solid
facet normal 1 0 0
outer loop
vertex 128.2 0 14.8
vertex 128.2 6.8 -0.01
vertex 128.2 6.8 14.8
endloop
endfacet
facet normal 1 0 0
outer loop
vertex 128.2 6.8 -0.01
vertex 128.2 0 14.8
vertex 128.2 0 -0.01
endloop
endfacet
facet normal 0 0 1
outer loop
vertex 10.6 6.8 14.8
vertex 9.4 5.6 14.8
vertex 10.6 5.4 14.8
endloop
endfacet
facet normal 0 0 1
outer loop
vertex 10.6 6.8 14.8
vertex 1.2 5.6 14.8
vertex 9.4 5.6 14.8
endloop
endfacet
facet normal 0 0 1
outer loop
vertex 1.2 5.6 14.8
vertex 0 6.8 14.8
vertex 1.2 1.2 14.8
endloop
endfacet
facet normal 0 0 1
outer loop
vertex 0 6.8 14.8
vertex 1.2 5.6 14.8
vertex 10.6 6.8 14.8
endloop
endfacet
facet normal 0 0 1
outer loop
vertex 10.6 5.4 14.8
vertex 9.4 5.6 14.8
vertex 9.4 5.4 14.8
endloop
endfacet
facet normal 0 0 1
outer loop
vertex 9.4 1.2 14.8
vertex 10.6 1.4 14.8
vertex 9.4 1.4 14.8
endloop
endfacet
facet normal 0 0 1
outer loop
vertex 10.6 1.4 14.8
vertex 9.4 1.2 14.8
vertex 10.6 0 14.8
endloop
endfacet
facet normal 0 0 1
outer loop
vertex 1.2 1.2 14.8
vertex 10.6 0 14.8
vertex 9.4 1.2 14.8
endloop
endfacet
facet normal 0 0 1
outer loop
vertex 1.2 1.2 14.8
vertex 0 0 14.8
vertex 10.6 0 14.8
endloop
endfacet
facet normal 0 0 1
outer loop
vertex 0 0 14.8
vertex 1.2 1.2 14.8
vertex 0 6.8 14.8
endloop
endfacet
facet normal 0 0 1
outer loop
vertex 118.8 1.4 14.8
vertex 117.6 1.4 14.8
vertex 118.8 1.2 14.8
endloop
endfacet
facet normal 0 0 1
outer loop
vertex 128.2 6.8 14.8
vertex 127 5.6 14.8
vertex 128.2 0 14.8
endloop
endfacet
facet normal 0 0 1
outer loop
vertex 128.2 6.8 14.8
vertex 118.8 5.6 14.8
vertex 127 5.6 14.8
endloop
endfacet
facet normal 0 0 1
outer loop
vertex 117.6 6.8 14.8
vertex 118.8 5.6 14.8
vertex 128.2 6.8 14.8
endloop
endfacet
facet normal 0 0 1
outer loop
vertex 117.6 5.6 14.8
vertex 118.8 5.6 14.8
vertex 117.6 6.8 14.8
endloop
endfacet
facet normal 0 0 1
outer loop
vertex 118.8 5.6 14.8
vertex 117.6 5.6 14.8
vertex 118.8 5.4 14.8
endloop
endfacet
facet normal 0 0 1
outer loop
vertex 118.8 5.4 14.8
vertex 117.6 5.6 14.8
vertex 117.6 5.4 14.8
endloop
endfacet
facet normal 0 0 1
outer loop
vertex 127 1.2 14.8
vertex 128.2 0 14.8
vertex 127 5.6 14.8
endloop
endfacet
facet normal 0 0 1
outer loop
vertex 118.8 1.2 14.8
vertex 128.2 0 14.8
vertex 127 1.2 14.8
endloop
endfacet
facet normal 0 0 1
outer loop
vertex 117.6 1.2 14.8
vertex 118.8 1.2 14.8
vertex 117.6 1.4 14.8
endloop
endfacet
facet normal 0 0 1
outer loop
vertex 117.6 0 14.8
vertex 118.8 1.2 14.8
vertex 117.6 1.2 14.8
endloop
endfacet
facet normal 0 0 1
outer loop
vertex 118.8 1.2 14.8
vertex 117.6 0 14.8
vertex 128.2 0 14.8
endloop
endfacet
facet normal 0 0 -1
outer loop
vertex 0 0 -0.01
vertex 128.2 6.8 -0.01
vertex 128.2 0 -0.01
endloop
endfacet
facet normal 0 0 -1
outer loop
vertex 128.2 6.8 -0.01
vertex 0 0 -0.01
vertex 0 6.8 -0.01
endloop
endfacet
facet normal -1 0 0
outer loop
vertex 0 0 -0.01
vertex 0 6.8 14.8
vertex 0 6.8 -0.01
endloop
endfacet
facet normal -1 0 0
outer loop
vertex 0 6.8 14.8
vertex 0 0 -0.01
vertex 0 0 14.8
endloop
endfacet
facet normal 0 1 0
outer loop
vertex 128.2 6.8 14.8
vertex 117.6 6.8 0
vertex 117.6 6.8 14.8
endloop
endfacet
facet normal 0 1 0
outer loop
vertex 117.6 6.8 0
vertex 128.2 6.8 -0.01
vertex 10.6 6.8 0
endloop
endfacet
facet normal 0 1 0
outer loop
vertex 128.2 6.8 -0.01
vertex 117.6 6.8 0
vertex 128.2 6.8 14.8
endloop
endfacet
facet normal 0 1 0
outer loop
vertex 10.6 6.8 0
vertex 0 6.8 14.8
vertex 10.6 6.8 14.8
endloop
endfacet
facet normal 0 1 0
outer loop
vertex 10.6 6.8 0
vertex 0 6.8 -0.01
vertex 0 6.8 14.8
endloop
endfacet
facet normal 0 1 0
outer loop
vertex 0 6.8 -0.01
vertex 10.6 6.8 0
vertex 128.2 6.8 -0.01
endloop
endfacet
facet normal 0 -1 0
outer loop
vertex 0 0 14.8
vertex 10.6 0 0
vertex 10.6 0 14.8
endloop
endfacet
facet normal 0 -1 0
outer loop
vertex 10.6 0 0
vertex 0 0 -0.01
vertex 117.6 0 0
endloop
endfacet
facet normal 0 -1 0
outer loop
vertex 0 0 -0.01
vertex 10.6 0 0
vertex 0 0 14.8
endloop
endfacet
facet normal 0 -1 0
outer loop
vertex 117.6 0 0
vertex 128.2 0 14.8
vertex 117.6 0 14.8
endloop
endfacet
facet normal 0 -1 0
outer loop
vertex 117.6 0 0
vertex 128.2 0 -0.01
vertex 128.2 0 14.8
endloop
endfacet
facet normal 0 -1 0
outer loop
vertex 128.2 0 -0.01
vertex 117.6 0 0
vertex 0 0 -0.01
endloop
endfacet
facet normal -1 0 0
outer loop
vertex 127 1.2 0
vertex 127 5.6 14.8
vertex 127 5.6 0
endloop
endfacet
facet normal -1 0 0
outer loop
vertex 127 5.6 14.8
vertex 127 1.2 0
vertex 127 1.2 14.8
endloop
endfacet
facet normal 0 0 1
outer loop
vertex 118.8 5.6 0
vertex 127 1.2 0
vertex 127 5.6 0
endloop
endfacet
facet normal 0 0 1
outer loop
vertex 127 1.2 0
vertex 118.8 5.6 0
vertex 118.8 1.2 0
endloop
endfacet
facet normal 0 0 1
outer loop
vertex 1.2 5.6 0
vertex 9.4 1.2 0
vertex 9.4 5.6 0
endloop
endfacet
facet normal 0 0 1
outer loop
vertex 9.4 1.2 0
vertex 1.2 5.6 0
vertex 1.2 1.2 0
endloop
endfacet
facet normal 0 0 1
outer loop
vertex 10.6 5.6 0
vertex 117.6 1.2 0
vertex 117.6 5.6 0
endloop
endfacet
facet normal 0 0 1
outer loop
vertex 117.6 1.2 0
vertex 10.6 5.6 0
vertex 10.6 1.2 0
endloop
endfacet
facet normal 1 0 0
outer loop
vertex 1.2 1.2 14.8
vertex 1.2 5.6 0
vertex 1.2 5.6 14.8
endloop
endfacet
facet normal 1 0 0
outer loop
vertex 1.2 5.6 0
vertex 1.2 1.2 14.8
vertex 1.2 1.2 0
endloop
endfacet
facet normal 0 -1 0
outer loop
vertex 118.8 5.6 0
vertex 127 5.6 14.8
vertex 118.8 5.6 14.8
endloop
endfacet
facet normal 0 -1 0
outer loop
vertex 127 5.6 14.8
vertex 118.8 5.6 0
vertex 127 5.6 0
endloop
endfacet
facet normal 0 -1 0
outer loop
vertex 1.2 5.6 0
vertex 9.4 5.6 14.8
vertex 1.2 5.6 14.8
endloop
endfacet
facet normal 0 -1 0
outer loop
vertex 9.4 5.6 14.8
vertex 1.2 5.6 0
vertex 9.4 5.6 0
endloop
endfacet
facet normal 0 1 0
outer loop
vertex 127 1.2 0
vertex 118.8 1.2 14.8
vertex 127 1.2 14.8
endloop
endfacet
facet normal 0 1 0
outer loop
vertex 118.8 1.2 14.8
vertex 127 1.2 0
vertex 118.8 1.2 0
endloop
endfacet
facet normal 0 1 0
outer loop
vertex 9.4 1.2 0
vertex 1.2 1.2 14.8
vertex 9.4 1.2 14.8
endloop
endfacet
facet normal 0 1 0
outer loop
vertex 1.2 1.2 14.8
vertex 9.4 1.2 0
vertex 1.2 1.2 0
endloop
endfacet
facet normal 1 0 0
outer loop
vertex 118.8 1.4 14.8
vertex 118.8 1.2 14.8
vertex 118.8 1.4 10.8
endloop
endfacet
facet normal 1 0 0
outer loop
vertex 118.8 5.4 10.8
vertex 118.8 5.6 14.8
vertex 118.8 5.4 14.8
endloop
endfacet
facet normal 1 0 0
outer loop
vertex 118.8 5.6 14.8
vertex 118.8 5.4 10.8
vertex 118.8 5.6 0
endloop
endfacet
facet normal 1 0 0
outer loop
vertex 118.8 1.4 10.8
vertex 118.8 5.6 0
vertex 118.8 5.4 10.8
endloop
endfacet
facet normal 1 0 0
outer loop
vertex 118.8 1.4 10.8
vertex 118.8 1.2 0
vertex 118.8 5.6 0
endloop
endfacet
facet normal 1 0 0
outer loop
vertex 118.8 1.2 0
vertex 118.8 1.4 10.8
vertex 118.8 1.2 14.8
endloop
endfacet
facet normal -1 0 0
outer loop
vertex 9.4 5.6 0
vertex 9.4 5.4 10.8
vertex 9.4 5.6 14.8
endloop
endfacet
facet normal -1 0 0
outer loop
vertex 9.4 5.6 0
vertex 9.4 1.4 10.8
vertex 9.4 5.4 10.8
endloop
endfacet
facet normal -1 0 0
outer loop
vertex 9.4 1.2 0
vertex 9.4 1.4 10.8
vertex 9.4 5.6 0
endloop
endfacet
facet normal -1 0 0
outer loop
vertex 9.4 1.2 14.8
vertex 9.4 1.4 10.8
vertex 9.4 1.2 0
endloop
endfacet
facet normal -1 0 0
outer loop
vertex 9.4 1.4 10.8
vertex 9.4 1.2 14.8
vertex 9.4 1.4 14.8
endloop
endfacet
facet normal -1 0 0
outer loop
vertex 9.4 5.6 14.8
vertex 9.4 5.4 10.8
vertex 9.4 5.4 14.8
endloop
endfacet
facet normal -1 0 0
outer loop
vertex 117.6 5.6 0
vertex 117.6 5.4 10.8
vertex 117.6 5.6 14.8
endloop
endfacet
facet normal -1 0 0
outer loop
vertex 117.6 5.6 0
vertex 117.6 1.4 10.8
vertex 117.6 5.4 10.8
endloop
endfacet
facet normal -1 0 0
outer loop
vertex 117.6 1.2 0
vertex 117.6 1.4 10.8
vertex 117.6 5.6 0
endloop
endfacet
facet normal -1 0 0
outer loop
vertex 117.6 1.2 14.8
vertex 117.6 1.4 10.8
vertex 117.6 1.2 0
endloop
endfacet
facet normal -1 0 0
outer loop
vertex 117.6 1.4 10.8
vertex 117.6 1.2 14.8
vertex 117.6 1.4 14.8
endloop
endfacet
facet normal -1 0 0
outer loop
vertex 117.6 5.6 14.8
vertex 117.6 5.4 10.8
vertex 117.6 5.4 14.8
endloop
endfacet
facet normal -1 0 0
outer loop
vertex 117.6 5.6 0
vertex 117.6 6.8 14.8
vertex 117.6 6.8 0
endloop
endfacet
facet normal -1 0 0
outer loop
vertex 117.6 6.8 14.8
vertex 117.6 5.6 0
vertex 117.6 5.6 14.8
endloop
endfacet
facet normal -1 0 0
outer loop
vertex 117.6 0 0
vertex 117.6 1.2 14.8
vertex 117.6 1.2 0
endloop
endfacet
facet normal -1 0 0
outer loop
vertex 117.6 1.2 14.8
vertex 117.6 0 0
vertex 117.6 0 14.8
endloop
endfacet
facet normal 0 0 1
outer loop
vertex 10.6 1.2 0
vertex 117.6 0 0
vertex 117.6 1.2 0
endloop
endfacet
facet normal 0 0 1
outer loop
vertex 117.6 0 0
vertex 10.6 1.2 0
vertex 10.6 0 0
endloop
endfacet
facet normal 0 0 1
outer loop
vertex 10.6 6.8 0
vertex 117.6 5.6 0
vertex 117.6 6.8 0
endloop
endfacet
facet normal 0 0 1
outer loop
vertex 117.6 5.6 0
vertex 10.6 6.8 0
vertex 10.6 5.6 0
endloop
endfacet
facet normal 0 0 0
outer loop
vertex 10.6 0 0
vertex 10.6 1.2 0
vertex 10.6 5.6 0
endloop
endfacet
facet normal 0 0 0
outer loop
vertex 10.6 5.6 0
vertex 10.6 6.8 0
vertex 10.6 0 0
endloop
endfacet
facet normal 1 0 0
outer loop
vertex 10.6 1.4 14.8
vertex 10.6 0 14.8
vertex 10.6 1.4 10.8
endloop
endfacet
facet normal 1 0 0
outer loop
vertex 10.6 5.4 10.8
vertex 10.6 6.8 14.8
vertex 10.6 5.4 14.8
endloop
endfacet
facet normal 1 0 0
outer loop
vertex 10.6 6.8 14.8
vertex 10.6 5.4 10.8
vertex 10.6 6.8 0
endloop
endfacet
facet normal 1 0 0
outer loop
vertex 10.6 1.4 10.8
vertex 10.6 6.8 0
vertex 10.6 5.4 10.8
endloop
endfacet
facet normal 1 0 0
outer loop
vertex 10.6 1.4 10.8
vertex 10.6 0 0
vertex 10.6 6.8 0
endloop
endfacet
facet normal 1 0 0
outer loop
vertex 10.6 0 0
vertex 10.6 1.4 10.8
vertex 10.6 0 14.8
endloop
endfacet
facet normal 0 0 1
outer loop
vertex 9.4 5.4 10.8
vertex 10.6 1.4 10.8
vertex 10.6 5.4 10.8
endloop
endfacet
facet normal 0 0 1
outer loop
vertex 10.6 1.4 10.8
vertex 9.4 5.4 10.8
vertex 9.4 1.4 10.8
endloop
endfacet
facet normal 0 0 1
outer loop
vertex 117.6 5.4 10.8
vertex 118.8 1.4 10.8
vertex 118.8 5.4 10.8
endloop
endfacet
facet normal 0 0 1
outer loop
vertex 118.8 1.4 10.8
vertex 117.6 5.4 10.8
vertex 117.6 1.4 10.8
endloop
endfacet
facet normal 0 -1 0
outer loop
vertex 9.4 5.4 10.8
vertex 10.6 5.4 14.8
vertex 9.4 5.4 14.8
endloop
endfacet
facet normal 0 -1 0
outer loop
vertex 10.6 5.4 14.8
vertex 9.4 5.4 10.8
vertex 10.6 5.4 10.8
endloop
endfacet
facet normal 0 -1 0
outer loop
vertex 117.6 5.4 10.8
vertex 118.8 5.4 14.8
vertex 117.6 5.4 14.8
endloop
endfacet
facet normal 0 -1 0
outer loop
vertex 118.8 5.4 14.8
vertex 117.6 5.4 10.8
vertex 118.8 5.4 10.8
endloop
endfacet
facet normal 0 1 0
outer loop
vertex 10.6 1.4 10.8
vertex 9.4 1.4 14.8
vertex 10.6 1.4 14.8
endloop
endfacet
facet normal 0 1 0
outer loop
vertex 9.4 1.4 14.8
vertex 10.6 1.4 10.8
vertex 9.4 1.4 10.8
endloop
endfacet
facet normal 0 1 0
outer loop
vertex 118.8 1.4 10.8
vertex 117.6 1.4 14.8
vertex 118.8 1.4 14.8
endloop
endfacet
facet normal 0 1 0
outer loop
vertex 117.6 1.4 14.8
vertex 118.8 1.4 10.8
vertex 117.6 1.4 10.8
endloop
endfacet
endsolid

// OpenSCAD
// file: ../Base/Boxes.scad
// Fischertechnik Box Foundation
// Pre-designed Boxes

use <Constants.scad>

include <PlacementOptions.scad>

box190Width = 190;
box190Depth = 130;
box130Width = 130;
box130Depth = 95;
boxUsageHeight = 33.9;
boxWallThickness = 2.4;
boxBaseThickness = 1.0;
boxWebWidth = 3.0;

// getBoxWallThickness()
// Gets the wall thickness of a Fischertechnik Box

function getBoxWallThickness() = boxWallThickness;

// Gets the usable height of a fischertechnik box
function getBoxUsageHeight() = boxUsageHeight;

// Gets the thickness of the Fischertechnik box base.
function getBoxBaseThickness() = boxBaseThickness;

// Gets the width of a box web
function getBoxWebWidth() = boxWebWidth;

// Gets the usable inner space of a Box 190 as an x/y-list
function getBox190Space() = [
    box190Width - 2*getBoxWallThickness(), 
    box190Depth - 2*getBoxWallThickness() ];

// Imports the Fischertechnik empty box 130x190 mm and places it at position 0,0
// 190x130 are the outer sizes, the inner space is slightly smaller. Use getBox190Space() to get the inner sizes.
// This module needs the STL file "Fischertechnik Box 130x190.stl" in the library path.
// The box is positioned that the usable inner space is at the 0,0,0 position. The

module Box190() {
    translate([-getBoxWallThickness(),-getBoxWallThickness(),-getBoxBaseThickness()])
        import("Fischertechnik Box 130x190.stl", convexity=3);
}

// Gets the usable inner space of a Box 130 as an x/y-list
function getBox130Space() = [
    box130Width - 2*getBoxWallThickness(), 
    box130Depth - 2*getBoxWallThickness() ];

// Imports the Fischertechnik empty box 95x130 mm and places it at position 0,0
// 190x130 are the outer sizes, the inner space is slightly smaller. Use getBox190Space() to get the inner sizes.
// This module needs the STL file "Fischertechnik Box 95x130.stl" in the library path.
// The box is positioned that the usable inner space is at the 0,0,0 position. The

module Box130() {
    translate([-getBoxWallThickness(),-getBoxWallThickness(),-getBoxBaseThickness()])
        import("Fischertechnik Box 95x130.stl", convexity=3);
}

// Creates a web at the specified box walls
// corner 0 = LowerLeft, 1 = UpperLeft, 2 = UpperRight, 3 = LowerRight
// side 0 = LeftOfCorner, 1 = RightOfCorner
// distance = Distance in mm from the corner
// box = inner width and depth of the box (default: Box 190)
// webWidth = length of the web (default is 3 mms)
// webThickness = thickness of the web (default is 1 mm)

module BoxWeb(corner, side, distance, box=getBox190Space(), webWidth=getBoxWebWidth(), webThickness=1.0) {
    sink = getBoxWallThickness()/2;

    width = (corner % 2 == 0) ? 
            (side == LeftOfCorner ? webWidth : webThickness) :
            (side == LeftOfCorner ? webThickness : webWidth);

    depth = (corner % 2 == 0) ? 
            (side == RightOfCorner ? webWidth : webThickness) :
            (side == RightOfCorner ? webThickness : webWidth);
    
    xDiff = corner == LowerLeft ? 
                (side == LeftOfCorner ? -sink : distance) :
            (corner == UpperLeft ?                
                (side == LeftOfCorner ? distance : -sink) :
            (corner == UpperRight ?
                (side == LeftOfCorner ? box.x-webWidth+sink : box.x-distance-webThickness) :
                (side == LeftOfCorner ? box.x-distance-webThickness: box.x-webWidth+sink)));

    yDiff = corner == LowerLeft ? 
                (side == RightOfCorner ? -sink : distance) :
            (corner == UpperLeft ?
                (side == RightOfCorner ? box.y-distance : box.y-webWidth+sink) :
            (corner == UpperRight ?
                (side == RightOfCorner ? box.y-webWidth+sink : box.y-distance) :
                (side == RightOfCorner ? distance : -sink)));
    
    translate([xDiff, yDiff, -getExcess()])
        cube([width, depth, boxUsageHeight + 2*getExcess()]);
}
// file: ../Base/Rotation.scad
// Fischertechnik Box Foundation
// Geometry Helpers Rotation

include <PlacementOptions.scad>

// getRotatedSpace(space, rotation=NoRotation)
// Rotates the space dependent on the specified rotation

function getRotatedSpace(space, rotation=NoRotation) = [
    (rotation == Rotate90 || rotation == Rotate270) ? space.y : space.x,
    (rotation == Rotate90 || rotation == Rotate270) ? space.x : space.y
];

// Rotates the given space around the fixed left lower corner
// space = the space the children needs as width/depth list [width,depth]
// rotation = 0 Rotate0 degrees, 1 Rotate90 degrees, 2 Rotate180 degrees, 3 Rotate270 degrees (equivalent to -90)

module RotateFix(space, rotation=Rotate0) {
    dy = (rotation == Rotate0 || rotation == Rotate270) ? 0 :
        (rotation == Rotate90) ? space.x :
        space.y;
    dx = (rotation < Rotate180) ? 0 :
        (rotation == Rotate180) ? space.x :
        space.y;
    
    translate([dx, dy, 0])
        rotate([0, 0, rotations[rotation]])
            children();
}
// file: ../Base/Alignment.scad
// Fischertechnik Box Foundation
// Geometry Helpers Alignment

include <PlacementOptions.scad>

// getAlignedX(elementWidth, spaceWidth, align=AlignRight, offset=0)
// Gets the aligned X offset of an element with the given
// width in the given space.
// elementWidth = The width of the element to positon
// spaceWidth = The space where the element should be aligned
// align = 0 AlignLeft, 1 AlignCenter, 2 AlignRight
// offset = an optional offset from the aligned position. When
// aligned left or centered, then positive values are in X direction.
// When aligned right then positive values are in negative X direction.

function getAlignedX(elementWidth, spaceWidth, align=AlignRight, offset=0) =
    (align == AlignLeft) ?
        offset :
        ((align == AlignCenter) ?
        (spaceWidth - elementWidth)/2 + offset :
        spaceWidth - offset - elementWidth);

// getAlignedY(elementDepth, spaceDepth, align=AlignTop, offset=0)
// Gets the aligned Y offset of an element with the given
// depth in the given space.
// elementDepth = The depth of the element to positon
// spaceDepth = The space where the element should be aligned
// align = 0 AlignBottom, 1 AlignCenter, 2 AlignTop
// offset = an optional offset from the aligned position. When
// aligned bottom or centered, then positive values are in Y direction.
// When aligned top then positive values are in negative Y direction.

function getAlignedY(elementDepth, spaceDepth, align=AlignTop, offset=0) =
    (align == AlignBottom) ?
        offset :
        ((align == AlignCenter) ?
        (spaceDepth - elementDepth)/2 + offset :
        spaceDepth - offset - elementDepth);
// file: ../Base/PlacementOptions.scad
// Fischertechnik Box Foundation
// Placement Options

// Alignment
NoAlign = 0;
AlignLeft = 1;
AlignBottom = 2;
AlignCenter = 3;
AlignRight = 4;
AlignTop = 5;

// Element rotation degree steps
rotations = [0, -90, -180, -270];

// Rotation
NoRotation = 0;
Rotate0 = 0;
Rotate90 = 1;
Rotate180 = 2;
Rotate270 = 3;

// Docking (seen from above)
NoDock = -1;
DockLeft = 0;
DockTop = 1;
DockRight = 2;
DockCorner = 2;
DockBottom = 3;

// Web corners
LowerLeft = 0;
UpperLeft = 1;
UpperRight = 2;
LowerRight = 3;

// Web position relative to corner
LeftOfCorner = 0;
RightOfCorner = 1;
// file: ../Base/Placement.scad
// Fischertechnik Box Foundation
// Geometry Helpers Placement

use <Constants.scad>
use <Alignment.scad>
use <Rotation.scad>
use <Boxes.scad>

include <PlacementOptions.scad>

// Place(x=0, y=0, elementSpace=[0,0], alignX=AlignLeft, alignY=AlignBottom, rotation=Rotate0, boxSpace=getBox190Space())
// Places the child at the specified position
// y = Y-Position. This is a relative position when an X aligment is specified.
// x = X-Position. This is a relative position when an Y aligment is specified.
// elementSpace = space of the element to be placed [x,y]
// alignX = -1=NoAlign, 0 AlignLeft, 1 AlignCenter, 3 AlignRight (elementSpace and boxSpace required!)
// alignY = -1=NoAlign, 2 AlignBottom, 1 AlignCenter, 4 AlignTop (elementSpace and boxSpace required!)
// rotation = 0 Rotate0 0 degrees, 1 Rotate90 90 degrees, 
// 2 Rotate180 180 degrees, 3 Rotate270 270 degrees (equivalent to -90)
// boxSpace = Inner space of the box where the placement occurs [x,y] - default is Box 190x130 inner space

module Place(x=0, y=0, elementSpace=[0,0], 
  alignX=AlignLeft, alignY=AlignBottom, 
  rotation=NoRotation, boxSpace=getBox190Space()) {

    module Position(x, y, space, rotation=Rotate0) {
        translate([x, y, 0])
            RotateFix(space, rotation)
                children();
    }

    space = getRotatedSpace(elementSpace, rotation);
    alignedX = getAlignedX(space.x, boxSpace.x, alignX, x);
    alignedY = getAlignedY(space.y, boxSpace.y, alignY, y);
    Position(alignedX, alignedY, elementSpace, rotation)
        children();
}

// Center(space=getBox130Space(), elementSpace=[0,0])
// space = Space where the children is centered. For cylinder use centered=true and no elementSpace.
// elementSpace = space of the element to be centered [x,y]

module Center(space=getBox190Space(), elementSpace=[0,0]) {
    translate([(space.x - elementSpace.x) / 2, (space.y - elementSpace.y) / 2])
        children(0);
}

// CenterHorizontal(width=0, y=0, offset=0, space=getBox130Space())
// space = Space where the children is centered. For cylinder use centered=true and no elementSpace.
// elementSpace = space of the element to be centered [x,y]

module CenterHorizontal(width=0, y=0, offset=0, space=getBox190Space()) {
    translate([(space.x - width) / 2 + offset, y])
        children(0);
}

// CenterVertical(depth=0, x=0, offset=0, space=getBox130Space())
// space = Space where the children is centered. For cylinder use centered=true and no elementSpace.
// elementSpace = space of the element to be centered [x,y]

module CenterVertical(depth=0, x=0, offset=0, space=getBox190Space()) {
    translate([x, (space.y - depth) / 2 + offset])
        children(0);
}
// file: ../Base/Constants.scad
// Fischertechnik Box Foundation
// Constants

// Constant values necessary for multiple elements

// Base constants
dividerThickness = 1.2;
excess = 0.01;
fragments = 90;
tolerance = 0.8;

// Gets the thickness of a divider 
function getDividerThickness() = dividerThickness;

// Gets the excess that is used to merge walls into each other
function getExcess() = excess;

// Gets amount of fragments of a cylinder
function getFragments() = fragments;

// Gets the inner tolerance of a frame to each side
function getTolerance() = tolerance;


// Fischertechnik specific constants
axisDiameter = 4;
axisBottomDiameter = axisDiameter + 1;
standardEdgeDistance = 2.5;
standardWebDistance = 11.5;
standardCornerLength = 15;
tubeWallFactor = 0.8;

// Gets axis diameter
function getAxisDiameter() = axisDiameter;

// Gets axis bottom diameter for thicker part at the bottom
function getAxisBottomDiameter() = axisBottomDiameter;

// gets the standard distance to the wall of the box for dockable frames with webs
function getStandardEdgeDistance() = standardEdgeDistance;

// gets the standard distance of each web to the corner of the dockable frame
function getStandardWebDistance() = standardWebDistance;

// gets the standard length of the corner walls of a dockable frame
function getStandardCornerLength() = standardCornerLength;

// gets the wall thickness of a tube.
function getTubeWallThickness() = tubeWallFactor * getDividerThickness();
// main file
// Fischertechnik Box Library
// Frame for single 125 mm Axis
// 31036

use <../ModelBase/Complex.scad>

length = 125;

// getFrameAxis125Space()
// Gets the width (.x) and depth (.y) of the axis frame.

function getFrameAxis125Space() = getFrameAxisSpace(length);

// FrameAxis125()
// Axis holder for a single 125 mm axis.

module FrameAxis125() {
    FrameAxis(length);
}

// Test
color("lightgray")
FrameAxis125();
